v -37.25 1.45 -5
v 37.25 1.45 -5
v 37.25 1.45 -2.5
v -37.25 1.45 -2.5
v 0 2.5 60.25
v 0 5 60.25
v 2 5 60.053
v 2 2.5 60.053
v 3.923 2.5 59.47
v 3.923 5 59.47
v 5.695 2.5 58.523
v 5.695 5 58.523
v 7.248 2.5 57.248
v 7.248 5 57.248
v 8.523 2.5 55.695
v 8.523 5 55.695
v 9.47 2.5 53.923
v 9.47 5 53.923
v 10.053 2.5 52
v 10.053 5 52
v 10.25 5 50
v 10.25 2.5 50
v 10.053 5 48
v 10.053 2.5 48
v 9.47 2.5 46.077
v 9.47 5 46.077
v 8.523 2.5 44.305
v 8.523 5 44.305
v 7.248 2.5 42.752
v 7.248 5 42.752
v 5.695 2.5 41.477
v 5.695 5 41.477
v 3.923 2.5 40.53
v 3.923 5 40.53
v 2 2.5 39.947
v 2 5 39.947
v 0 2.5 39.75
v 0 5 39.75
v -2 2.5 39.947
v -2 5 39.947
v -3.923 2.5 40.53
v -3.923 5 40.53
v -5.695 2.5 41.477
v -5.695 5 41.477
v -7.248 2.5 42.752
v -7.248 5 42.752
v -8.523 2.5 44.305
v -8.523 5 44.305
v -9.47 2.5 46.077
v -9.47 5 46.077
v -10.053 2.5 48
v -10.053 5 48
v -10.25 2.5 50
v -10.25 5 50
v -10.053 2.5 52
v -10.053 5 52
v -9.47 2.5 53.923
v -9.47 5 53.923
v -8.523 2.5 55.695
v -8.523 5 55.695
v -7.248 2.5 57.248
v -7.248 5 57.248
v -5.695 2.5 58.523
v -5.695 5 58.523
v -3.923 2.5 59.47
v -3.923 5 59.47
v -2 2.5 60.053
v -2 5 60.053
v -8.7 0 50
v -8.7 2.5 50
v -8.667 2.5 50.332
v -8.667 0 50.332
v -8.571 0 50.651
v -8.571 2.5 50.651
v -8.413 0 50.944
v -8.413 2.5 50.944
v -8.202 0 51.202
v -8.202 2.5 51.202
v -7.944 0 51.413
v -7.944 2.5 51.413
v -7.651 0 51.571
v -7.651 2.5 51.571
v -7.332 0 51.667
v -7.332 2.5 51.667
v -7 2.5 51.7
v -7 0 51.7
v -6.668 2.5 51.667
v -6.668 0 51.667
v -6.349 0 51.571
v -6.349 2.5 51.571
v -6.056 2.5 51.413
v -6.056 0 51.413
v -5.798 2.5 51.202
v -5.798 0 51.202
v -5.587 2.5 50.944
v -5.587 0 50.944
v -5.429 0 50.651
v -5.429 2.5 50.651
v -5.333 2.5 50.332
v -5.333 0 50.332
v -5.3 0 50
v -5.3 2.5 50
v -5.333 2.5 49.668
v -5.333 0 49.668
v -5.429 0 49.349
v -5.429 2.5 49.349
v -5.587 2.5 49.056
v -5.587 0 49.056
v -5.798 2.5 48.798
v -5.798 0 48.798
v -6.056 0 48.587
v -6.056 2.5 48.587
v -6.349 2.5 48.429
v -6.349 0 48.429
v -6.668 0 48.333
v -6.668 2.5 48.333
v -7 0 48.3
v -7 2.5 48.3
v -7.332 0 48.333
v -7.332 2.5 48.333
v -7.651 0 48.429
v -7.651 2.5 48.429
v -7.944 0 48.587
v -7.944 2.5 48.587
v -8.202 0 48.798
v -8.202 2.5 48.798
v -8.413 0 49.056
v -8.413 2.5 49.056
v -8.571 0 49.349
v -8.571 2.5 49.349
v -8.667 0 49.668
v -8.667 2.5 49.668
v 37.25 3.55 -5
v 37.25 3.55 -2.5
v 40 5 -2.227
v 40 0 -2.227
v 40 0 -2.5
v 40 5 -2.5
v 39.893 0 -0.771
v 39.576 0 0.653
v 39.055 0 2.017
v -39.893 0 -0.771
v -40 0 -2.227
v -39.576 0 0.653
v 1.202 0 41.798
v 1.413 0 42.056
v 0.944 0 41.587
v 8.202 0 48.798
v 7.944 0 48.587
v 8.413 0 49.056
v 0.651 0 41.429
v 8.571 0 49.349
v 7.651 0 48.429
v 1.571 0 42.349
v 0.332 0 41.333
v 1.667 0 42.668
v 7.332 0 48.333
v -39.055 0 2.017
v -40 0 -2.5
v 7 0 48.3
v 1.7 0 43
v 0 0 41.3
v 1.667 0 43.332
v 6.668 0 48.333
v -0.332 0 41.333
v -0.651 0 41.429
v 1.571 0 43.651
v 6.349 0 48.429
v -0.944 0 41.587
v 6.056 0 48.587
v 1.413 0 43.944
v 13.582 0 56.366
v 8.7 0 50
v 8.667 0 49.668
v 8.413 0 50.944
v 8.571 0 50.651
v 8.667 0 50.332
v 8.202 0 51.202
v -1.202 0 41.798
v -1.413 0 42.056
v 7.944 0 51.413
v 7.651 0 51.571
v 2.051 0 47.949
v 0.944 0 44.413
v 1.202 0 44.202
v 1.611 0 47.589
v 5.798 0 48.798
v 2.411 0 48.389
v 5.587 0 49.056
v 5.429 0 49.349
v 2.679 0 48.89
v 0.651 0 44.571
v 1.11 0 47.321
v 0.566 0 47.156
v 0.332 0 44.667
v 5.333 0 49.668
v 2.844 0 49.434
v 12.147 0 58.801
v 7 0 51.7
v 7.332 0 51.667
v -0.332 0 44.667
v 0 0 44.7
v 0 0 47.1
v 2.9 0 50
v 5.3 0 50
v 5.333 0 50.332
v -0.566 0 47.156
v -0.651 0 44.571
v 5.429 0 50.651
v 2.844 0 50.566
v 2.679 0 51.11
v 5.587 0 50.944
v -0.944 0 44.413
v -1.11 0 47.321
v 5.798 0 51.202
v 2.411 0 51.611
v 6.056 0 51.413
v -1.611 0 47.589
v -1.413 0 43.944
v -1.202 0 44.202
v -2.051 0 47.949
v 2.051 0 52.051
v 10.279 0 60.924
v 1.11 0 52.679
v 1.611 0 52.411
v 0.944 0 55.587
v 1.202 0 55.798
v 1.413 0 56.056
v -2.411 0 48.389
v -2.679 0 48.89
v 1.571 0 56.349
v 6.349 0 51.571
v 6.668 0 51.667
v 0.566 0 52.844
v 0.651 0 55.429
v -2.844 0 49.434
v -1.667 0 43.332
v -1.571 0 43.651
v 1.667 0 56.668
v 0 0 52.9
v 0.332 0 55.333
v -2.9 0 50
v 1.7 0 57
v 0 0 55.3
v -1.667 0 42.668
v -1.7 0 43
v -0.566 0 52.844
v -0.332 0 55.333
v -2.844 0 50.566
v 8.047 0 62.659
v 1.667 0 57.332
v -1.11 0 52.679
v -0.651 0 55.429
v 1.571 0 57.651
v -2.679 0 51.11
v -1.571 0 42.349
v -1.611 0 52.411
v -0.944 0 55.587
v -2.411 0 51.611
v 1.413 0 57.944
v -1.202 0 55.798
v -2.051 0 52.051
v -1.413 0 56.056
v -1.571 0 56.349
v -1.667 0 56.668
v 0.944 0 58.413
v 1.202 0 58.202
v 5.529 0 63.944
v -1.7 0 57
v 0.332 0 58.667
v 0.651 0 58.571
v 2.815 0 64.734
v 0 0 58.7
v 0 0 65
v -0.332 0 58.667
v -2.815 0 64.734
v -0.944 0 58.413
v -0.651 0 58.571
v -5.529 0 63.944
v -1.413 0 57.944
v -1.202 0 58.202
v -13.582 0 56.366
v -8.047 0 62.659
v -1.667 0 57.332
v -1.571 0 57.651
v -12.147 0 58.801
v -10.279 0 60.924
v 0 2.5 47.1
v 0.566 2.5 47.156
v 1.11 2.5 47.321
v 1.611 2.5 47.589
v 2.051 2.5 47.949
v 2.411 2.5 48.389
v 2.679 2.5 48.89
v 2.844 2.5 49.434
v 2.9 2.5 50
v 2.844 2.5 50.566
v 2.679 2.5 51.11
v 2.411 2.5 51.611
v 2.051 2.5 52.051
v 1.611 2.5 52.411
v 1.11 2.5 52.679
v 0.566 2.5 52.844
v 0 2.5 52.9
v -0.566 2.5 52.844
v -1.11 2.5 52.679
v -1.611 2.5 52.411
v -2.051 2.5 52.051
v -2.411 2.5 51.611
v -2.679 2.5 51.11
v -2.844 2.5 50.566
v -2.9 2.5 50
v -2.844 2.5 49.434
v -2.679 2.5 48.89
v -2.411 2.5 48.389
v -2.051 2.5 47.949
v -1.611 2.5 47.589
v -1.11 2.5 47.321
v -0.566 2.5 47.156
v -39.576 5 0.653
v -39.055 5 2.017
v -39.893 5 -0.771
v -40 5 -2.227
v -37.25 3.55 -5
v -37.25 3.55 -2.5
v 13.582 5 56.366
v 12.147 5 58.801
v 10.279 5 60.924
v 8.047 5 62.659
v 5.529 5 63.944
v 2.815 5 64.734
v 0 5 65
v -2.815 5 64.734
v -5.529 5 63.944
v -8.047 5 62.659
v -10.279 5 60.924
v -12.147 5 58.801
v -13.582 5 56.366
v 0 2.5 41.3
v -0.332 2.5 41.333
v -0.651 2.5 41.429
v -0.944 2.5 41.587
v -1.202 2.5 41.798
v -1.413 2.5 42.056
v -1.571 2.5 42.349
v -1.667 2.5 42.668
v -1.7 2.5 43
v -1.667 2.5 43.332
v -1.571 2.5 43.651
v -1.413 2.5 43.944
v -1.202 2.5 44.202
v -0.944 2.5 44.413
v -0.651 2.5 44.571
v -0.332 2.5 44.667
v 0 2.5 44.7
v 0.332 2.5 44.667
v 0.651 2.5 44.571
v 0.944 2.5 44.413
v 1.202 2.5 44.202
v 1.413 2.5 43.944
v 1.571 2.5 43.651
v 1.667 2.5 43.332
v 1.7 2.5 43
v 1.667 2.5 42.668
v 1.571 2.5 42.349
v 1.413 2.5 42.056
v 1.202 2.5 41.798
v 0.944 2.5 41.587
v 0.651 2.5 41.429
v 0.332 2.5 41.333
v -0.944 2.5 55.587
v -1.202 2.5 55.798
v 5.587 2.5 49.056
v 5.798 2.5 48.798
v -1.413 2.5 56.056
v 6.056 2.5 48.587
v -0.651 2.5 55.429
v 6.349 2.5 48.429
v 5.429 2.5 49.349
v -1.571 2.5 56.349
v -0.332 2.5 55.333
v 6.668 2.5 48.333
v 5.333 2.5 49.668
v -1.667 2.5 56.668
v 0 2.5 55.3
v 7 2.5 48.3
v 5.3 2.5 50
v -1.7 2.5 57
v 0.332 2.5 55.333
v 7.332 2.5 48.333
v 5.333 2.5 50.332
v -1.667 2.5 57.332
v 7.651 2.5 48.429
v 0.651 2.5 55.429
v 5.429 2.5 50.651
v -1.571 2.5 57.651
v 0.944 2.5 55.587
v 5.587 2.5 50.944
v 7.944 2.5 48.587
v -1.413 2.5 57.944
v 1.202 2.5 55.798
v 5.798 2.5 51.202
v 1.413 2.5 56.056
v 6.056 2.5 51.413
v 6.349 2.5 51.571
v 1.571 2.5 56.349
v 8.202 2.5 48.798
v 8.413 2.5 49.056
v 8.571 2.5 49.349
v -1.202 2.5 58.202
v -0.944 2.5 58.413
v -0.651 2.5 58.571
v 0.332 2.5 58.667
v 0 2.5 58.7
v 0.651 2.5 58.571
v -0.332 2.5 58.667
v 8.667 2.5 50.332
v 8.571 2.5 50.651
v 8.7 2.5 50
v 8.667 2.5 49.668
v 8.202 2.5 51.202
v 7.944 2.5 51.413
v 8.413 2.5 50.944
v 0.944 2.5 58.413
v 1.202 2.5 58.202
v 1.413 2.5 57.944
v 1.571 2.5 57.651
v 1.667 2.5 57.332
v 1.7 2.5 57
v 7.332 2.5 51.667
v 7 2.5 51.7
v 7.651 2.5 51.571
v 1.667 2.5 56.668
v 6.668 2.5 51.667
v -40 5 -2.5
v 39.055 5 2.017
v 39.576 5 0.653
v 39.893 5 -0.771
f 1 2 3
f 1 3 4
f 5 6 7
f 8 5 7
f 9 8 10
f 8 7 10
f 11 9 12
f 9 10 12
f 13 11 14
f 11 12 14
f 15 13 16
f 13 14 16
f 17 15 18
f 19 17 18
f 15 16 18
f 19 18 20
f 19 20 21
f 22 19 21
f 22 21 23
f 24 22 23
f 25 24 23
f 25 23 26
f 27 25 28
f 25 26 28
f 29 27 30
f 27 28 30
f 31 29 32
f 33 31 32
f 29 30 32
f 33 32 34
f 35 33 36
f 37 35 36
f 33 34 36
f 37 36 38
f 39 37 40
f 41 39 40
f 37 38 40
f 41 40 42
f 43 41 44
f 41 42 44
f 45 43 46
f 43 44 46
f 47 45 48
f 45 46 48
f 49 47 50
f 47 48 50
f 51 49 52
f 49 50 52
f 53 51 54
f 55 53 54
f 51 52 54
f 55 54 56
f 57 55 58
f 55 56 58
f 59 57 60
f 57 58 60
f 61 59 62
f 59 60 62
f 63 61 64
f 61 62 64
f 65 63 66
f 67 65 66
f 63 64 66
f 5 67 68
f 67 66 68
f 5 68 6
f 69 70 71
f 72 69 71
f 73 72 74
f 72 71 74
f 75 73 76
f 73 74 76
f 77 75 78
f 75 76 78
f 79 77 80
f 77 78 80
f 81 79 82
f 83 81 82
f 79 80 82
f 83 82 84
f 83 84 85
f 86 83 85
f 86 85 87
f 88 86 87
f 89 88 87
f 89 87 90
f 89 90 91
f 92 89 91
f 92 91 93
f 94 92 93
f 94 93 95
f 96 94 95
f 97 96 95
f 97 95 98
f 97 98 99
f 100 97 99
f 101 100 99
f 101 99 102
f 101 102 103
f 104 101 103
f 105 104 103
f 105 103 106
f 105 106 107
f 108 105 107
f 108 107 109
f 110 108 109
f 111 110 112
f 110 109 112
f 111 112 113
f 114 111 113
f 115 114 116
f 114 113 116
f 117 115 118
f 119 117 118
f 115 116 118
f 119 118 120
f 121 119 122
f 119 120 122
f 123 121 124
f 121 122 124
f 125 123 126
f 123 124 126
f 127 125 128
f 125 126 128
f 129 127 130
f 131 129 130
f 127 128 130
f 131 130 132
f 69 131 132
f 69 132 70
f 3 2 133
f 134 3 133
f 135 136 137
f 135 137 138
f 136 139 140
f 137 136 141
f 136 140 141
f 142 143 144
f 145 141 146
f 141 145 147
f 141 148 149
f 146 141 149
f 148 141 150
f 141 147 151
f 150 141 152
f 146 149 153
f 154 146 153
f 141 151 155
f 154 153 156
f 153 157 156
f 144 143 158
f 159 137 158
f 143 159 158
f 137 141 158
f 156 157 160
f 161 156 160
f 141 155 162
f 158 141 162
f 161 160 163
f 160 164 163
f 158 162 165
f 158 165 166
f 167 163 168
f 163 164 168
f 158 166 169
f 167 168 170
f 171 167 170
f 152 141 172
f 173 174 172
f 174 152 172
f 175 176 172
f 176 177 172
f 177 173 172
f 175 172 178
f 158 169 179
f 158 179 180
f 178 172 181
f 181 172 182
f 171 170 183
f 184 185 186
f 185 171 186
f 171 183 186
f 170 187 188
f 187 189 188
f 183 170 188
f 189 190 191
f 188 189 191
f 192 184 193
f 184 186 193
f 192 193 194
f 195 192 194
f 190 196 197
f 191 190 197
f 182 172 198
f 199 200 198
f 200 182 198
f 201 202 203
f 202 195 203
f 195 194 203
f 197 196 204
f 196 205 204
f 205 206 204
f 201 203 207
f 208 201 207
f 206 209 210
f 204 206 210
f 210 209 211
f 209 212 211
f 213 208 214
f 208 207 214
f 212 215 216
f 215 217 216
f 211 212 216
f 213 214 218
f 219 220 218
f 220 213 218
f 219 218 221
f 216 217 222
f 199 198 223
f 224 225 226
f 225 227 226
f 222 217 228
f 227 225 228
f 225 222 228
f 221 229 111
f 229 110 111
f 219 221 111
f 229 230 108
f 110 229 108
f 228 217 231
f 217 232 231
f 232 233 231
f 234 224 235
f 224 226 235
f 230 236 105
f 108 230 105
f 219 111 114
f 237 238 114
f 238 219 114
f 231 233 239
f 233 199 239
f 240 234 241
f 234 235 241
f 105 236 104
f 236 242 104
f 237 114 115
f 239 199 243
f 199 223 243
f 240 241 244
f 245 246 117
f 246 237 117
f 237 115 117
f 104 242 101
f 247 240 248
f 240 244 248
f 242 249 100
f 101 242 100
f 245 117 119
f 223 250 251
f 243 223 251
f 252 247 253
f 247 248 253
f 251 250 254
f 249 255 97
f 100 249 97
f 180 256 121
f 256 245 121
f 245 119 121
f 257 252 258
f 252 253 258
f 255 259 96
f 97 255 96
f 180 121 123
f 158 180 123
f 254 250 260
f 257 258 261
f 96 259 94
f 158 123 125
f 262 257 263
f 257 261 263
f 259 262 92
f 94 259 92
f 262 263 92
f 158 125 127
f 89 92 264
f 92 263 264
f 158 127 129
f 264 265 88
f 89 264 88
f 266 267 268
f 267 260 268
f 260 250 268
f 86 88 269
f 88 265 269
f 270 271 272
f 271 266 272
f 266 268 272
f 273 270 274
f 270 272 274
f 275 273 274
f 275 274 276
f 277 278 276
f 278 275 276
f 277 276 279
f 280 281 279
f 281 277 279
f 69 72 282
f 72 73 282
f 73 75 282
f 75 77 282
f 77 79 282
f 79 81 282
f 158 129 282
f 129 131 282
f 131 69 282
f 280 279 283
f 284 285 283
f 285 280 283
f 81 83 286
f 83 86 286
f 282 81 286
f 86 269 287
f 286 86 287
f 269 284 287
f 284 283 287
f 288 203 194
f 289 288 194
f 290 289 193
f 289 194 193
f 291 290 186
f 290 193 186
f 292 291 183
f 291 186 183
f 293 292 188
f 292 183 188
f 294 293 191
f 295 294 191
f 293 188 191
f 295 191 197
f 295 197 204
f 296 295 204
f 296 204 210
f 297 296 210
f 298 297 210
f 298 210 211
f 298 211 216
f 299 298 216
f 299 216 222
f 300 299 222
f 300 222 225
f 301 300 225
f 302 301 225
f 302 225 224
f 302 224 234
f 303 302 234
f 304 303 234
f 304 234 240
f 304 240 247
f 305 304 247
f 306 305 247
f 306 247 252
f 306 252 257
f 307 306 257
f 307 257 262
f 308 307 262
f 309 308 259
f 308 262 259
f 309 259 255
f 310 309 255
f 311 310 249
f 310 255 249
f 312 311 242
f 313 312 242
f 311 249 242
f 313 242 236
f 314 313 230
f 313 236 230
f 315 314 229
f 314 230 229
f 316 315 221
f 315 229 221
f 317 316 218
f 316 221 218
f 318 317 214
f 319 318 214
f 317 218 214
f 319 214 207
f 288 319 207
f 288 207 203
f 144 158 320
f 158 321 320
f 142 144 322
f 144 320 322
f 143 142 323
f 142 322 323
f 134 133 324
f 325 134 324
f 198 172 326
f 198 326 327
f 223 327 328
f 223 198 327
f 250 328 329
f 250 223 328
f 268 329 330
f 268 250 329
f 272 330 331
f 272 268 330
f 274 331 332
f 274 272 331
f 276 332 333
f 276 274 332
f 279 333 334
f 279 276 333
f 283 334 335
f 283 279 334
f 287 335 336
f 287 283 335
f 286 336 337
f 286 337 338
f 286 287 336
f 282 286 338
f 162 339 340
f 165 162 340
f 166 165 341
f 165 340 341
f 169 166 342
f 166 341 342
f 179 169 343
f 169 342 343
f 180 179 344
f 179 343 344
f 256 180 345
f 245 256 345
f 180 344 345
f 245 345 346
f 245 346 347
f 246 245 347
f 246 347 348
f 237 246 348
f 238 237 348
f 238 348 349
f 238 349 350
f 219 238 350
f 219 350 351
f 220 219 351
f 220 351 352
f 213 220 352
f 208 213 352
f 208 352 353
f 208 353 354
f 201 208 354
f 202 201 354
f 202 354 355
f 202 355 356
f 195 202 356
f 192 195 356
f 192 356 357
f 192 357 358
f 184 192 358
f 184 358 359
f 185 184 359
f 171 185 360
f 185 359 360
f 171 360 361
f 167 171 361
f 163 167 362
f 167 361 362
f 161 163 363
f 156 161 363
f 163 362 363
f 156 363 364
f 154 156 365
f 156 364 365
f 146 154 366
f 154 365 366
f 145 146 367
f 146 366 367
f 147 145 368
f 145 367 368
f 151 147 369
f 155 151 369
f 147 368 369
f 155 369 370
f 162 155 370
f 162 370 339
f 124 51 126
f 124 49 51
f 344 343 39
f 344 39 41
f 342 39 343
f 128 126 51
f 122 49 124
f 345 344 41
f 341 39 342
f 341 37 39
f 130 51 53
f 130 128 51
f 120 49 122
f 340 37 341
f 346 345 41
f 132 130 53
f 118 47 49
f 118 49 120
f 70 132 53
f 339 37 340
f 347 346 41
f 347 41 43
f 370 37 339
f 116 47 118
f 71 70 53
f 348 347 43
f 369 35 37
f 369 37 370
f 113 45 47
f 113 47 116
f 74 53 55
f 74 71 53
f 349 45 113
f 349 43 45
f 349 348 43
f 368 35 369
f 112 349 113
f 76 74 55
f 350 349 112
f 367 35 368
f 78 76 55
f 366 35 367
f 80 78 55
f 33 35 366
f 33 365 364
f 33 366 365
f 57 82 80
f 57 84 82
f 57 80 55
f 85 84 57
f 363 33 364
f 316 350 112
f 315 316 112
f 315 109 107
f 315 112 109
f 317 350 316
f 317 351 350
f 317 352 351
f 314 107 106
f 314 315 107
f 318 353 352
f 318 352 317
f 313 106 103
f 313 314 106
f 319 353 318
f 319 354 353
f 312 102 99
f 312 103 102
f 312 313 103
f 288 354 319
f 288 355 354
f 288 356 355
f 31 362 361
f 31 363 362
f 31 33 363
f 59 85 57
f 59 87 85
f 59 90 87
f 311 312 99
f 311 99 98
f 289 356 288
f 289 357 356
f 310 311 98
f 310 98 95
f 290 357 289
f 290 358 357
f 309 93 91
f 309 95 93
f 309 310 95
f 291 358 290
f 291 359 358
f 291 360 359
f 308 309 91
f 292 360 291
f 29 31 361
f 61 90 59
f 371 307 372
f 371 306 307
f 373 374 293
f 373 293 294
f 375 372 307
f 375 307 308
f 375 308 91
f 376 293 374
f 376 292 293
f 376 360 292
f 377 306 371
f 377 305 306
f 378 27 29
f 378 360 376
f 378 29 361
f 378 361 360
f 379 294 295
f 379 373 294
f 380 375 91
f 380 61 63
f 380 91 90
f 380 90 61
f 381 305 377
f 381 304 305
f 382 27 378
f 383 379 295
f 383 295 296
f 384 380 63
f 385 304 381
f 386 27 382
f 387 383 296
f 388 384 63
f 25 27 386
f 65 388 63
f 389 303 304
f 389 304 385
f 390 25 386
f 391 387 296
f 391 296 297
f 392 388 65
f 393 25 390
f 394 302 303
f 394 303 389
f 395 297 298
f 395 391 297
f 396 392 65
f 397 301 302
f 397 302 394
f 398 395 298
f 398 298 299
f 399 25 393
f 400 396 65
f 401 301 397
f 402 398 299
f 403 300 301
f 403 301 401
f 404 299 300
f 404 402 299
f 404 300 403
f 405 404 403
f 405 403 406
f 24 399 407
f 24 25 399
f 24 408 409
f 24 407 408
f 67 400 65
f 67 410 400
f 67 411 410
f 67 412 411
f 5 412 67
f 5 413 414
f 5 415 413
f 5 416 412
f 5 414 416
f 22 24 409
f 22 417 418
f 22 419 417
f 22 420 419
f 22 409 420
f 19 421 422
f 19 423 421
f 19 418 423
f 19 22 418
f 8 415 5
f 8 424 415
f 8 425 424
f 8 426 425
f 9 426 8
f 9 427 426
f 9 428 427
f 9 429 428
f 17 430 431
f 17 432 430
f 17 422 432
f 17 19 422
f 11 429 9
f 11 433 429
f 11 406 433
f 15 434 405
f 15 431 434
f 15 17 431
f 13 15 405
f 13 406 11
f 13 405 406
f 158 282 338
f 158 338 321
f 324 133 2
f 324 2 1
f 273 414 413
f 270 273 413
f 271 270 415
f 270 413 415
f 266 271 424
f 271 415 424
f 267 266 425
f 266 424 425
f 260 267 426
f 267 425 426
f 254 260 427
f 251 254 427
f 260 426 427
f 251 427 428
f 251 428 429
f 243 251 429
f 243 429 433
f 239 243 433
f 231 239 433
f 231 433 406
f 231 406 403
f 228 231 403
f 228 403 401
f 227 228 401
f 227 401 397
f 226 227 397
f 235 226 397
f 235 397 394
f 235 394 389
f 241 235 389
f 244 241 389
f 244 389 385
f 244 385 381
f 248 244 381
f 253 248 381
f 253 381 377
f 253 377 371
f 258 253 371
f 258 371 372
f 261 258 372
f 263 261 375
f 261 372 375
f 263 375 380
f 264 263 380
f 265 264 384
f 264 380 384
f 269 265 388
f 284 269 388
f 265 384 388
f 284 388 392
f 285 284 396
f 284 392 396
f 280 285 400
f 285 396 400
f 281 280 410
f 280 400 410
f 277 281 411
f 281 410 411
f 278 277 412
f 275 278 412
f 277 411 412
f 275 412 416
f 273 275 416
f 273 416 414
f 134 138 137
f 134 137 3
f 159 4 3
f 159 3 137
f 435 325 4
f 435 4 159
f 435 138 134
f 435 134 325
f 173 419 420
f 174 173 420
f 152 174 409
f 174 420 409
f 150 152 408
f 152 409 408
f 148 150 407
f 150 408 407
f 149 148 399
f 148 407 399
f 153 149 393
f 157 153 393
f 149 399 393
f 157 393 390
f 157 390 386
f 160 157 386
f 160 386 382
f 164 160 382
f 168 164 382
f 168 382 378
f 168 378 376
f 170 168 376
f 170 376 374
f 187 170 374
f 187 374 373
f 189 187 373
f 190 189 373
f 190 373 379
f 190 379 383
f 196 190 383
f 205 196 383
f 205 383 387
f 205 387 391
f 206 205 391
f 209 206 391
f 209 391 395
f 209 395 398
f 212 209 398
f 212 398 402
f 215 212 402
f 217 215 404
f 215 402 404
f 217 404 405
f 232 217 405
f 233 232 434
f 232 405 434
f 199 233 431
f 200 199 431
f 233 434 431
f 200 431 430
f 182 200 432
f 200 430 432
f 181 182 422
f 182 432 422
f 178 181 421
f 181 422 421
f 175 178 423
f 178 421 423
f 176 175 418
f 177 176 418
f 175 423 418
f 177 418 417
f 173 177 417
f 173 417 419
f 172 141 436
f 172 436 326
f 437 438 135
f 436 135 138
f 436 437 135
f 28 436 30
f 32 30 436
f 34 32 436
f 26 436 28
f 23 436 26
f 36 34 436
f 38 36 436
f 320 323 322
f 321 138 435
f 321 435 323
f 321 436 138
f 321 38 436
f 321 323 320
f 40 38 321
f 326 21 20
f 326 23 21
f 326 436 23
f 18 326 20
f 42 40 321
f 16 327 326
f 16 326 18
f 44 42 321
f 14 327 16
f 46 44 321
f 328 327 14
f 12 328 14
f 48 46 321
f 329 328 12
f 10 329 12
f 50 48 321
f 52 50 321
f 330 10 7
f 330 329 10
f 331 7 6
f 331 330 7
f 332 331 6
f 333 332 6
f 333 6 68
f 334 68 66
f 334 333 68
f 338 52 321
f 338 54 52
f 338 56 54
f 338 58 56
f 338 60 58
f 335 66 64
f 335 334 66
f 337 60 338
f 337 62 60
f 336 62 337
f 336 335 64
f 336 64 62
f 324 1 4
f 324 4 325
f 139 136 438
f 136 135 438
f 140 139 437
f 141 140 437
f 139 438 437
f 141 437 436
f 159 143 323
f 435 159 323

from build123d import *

# Parameters (mm, degrees)
BOSS_EXTRUDE1_DEPTH = 5
SKETCH3_W           = 80
SKETCH3_H           = 5
BOSS_EXTRUDE2_DEPTH = 5
SKETCH6_W           = 80
SKETCH6_H           = 5
SKETCH6_W_2         = 74.5
SKETCH6_H_2         = 2.1
CUT_EXTRUDE2_DEPTH  = 2.5
FILLET1_R           = 10
SKETCH7_R           = 2.9
CUT_EXTRUDE3_DEPTH  = 5
SKETCH8_R           = 1.7
CUT_EXTRUDE4_DEPTH  = 5
CIRPATTERN1_COUNT   = 4
SKETCH9_R           = 10.25
CUT_EXTRUDE5_DEPTH  = 2.5


with BuildPart() as part:
    # Sketch2 → Boss-Extrude1 (new body)
    with BuildSketch(Plane(origin=(0, 0, 0), x_dir=(1, 0, 0), z_dir=(0, 1, 0))):
        with BuildLine():
            Line((-40, 0), (40, 0))
            Line((40, 0), (13.582225242, -56.365780194))
            ThreePointArc((13.582225242, -56.365780194), (0, -65), (-13.582225242, -56.365780194))
            Line((-13.582225242, -56.365780194), (-40, 0))
        make_face()
    extrude(amount=BOSS_EXTRUDE1_DEPTH)

    # Sketch3 → Boss-Extrude2 (add)
    with BuildSketch(Plane(origin=(0, 0, 0), x_dir=(-1, 0, 0), z_dir=(0, 0, -1))):
        with Locations((0, 2.5)):
            Rectangle(SKETCH3_W, SKETCH3_H)
    extrude(amount=BOSS_EXTRUDE2_DEPTH)

    # Sketch6 → Cut-Extrude2 (cut)
    with BuildSketch(Plane(origin=(0, 0, -5), x_dir=(-1, 0, 0), z_dir=(0, 0, -1))):
        with Locations((0, 2.5)):
            Rectangle(SKETCH6_W, SKETCH6_H)
        with Locations((0, 2.5)):
            Rectangle(SKETCH6_W_2, SKETCH6_H_2, mode=Mode.SUBTRACT)
    extrude(amount=-CUT_EXTRUDE2_DEPTH, mode=Mode.SUBTRACT)

    # Fillet1
    fillet1_edges = [part.edges().sort_by_distance(p)[0] for p in [
        (-40, 2.5, 0),
        (40, 2.5, 0),
    ]]
    fillet(fillet1_edges, radius=FILLET1_R)

    # Sketch7 → Cut-Extrude3 (cut)
    with BuildSketch(Plane(origin=(0, 0, 0), x_dir=(-1, 0, 0), z_dir=(0, -1, 0))):
        with Locations(Location((0, -50, 0), (0, 0, 90))):
            Circle(SKETCH7_R)
    extrude(amount=-CUT_EXTRUDE3_DEPTH, mode=Mode.SUBTRACT)

    # Sketch8 → Cut-Extrude4 (cut)
    with BuildSketch(Plane(origin=(0, 5, 0), x_dir=(1, 0, 0), z_dir=(0, 1, 0))):
        with Locations(Location((0, -57, 0), (0, 0, 270))):
            Circle(SKETCH8_R)
    cut_extrude4 = extrude(amount=-CUT_EXTRUDE4_DEPTH, mode=Mode.SUBTRACT)

    # CirPattern1: Cut-Extrude4 ×4 about axis
    cirpattern1_axis = Axis((0, 0, 50), (0, 1, 0))
    for i in range(1, CIRPATTERN1_COUNT):
        add(cut_extrude4.rotate(cirpattern1_axis, i * 360 / CIRPATTERN1_COUNT), mode=Mode.SUBTRACT)

    # Sketch9 → Cut-Extrude5 (cut)
    with BuildSketch(Plane(origin=(0, 5, 0), x_dir=(1, 0, 0), z_dir=(0, 1, 0))):
        with Locations(Location((0, -50, 0), (0, 0, 270))):
            Circle(SKETCH9_R)
    extrude(amount=-CUT_EXTRUDE5_DEPTH, mode=Mode.SUBTRACT)


solid = part.part
